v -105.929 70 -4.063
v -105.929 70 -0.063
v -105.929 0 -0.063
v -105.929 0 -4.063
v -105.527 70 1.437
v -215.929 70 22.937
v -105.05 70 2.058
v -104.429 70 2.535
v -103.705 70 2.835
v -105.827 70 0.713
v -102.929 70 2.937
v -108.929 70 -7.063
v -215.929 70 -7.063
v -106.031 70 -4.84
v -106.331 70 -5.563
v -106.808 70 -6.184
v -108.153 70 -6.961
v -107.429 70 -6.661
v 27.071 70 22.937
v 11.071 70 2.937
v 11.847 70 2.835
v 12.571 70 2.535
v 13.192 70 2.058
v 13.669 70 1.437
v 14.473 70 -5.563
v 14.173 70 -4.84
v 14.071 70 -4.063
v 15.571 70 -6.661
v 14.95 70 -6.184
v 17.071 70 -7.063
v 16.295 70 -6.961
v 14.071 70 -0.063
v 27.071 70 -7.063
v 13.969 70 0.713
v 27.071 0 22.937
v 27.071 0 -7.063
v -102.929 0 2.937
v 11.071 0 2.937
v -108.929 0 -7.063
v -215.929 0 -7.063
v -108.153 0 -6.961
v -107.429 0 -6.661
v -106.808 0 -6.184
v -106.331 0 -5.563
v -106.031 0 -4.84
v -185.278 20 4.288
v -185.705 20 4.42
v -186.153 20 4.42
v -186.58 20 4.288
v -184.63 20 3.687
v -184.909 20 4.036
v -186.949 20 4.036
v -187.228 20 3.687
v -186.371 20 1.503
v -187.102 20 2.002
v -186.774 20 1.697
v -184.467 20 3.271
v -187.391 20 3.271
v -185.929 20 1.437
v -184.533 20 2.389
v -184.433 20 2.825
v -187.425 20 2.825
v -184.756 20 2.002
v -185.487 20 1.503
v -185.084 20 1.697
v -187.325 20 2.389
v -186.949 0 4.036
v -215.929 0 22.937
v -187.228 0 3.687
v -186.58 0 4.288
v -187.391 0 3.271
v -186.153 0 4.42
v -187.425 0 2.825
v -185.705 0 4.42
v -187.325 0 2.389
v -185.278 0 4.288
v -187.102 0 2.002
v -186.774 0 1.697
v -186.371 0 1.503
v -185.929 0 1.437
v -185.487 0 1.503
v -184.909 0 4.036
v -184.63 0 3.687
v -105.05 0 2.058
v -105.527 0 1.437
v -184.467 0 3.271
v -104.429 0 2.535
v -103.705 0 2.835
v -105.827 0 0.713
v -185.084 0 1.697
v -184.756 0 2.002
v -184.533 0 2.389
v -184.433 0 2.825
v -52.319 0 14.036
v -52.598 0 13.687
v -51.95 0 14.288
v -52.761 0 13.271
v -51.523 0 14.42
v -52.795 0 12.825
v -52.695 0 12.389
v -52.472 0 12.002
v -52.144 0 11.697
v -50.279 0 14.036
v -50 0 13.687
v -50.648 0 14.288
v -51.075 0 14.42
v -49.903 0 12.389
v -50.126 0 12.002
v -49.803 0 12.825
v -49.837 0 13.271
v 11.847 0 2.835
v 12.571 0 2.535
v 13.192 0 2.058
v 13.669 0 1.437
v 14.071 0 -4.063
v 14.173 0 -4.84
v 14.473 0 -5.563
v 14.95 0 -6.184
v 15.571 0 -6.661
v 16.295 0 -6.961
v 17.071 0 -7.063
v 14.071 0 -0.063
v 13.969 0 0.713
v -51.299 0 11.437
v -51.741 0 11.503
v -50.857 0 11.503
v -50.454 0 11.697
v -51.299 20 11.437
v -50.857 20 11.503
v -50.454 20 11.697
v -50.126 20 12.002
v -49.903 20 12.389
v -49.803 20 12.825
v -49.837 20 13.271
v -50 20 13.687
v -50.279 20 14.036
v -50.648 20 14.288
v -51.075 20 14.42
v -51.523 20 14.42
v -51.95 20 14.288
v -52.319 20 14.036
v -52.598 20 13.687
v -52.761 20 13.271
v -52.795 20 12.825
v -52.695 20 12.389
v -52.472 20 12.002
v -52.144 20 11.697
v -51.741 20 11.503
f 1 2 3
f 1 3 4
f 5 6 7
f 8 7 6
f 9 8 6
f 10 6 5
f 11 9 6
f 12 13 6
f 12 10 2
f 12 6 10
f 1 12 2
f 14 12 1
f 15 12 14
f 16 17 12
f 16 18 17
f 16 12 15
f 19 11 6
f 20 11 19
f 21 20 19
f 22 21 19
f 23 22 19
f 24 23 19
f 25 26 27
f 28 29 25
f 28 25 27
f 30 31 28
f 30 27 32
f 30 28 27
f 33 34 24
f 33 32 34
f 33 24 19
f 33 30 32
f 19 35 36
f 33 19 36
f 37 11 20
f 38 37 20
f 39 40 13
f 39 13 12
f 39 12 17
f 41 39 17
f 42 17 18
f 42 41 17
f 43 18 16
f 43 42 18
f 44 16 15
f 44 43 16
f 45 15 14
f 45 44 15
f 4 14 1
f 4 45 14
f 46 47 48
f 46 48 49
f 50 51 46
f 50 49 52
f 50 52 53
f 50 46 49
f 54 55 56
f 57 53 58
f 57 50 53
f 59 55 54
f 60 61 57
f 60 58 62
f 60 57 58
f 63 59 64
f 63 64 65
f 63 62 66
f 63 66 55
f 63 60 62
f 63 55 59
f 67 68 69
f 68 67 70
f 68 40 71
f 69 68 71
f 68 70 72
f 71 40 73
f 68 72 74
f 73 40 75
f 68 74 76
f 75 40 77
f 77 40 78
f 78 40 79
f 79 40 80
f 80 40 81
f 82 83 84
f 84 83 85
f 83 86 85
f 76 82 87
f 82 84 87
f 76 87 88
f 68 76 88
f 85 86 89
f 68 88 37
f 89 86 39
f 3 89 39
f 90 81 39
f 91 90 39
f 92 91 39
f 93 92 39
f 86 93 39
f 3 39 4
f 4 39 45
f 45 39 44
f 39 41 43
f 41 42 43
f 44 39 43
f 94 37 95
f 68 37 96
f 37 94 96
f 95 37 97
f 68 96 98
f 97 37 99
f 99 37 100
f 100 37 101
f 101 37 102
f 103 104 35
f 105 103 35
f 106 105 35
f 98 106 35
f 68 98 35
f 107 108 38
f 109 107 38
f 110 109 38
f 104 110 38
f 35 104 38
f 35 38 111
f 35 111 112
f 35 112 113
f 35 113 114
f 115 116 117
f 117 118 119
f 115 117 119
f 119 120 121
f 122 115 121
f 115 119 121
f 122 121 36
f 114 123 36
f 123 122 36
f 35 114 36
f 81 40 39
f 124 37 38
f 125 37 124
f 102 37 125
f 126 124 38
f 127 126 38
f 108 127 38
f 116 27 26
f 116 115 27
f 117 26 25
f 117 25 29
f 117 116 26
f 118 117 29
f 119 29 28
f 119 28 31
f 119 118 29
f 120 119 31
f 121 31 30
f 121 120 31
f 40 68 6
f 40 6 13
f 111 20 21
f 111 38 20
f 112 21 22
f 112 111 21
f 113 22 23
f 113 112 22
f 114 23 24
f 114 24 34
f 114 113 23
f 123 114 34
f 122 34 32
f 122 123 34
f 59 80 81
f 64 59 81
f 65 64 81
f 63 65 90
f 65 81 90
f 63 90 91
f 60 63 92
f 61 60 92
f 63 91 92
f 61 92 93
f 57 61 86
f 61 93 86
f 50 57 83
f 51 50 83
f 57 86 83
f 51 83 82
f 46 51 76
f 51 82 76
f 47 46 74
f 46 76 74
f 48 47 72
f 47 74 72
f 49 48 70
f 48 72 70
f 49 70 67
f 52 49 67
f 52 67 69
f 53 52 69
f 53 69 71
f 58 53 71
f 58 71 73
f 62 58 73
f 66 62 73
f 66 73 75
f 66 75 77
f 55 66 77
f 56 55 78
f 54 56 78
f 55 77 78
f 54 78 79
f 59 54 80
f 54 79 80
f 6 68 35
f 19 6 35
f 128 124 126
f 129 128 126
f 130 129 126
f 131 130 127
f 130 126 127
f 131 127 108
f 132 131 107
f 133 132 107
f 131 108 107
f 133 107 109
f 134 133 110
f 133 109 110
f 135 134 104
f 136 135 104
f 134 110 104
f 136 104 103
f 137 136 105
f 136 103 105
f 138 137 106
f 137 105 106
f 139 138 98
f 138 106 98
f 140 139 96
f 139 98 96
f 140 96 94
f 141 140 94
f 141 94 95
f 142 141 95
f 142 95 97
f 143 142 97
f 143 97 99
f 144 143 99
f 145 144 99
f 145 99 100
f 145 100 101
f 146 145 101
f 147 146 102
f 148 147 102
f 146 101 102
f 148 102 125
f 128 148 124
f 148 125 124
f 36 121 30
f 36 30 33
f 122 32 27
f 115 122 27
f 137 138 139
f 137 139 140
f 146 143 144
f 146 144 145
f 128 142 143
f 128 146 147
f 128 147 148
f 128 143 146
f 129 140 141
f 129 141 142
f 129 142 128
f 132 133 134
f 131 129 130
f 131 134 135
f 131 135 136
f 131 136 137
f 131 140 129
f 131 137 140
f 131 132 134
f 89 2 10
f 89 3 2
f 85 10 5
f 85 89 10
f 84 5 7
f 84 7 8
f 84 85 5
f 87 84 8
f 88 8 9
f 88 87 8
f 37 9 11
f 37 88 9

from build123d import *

# Parameters (mm, degrees)
SKETCH1_W           = 243
SKETCH1_H           = 30
BOSS_EXTRUDE1_DEPTH = 70
SKETCH2_W           = 120
SKETCH2_H           = 10
CUT_EXTRUDE1_DEPTH  = 70
FILLET1_R           = 3
SKETCH3_R           = 3
CUT_EXTRUDE2_DEPTH  = 20
SKETCH4_R           = 11.000191916
SKETCH4_R_2         = 5.90738233
BOSS_EXTRUDE2_DEPTH = 39
SKETCH5_R           = 1.5
CUT_EXTRUDE3_DEPTH  = 20


with BuildPart() as part:
    # Sketch1 → Boss-Extrude1 (new body)
    with BuildSketch(Plane(origin=(0, 0, 0), x_dir=(1, 0, 0), z_dir=(0, 1, 0))):
        with Locations((-94.428984733, -7.936828819)):
            Rectangle(SKETCH1_W, SKETCH1_H)
    extrude(amount=BOSS_EXTRUDE1_DEPTH)

    # Sketch2 → Cut-Extrude1 (cut)
    with BuildSketch(Plane(origin=(0, 70, 0), x_dir=(1, 0, 0), z_dir=(0, 1, 0))):
        with Locations((-45.928984733, 2.063171181)):
            Rectangle(SKETCH2_W, SKETCH2_H)
    extrude(amount=-CUT_EXTRUDE1_DEPTH, mode=Mode.SUBTRACT)

    # Fillet1
    fillet1_edges = [part.edges().sort_by_distance(p)[0] for p in [
        (14.071015267, 35, -7.063171181),
        (14.071015267, 35, 2.936828819),
        (-105.928984733, 35, 2.936828819),
        (-105.928984733, 35, -7.063171181),
    ]]
    fillet(fillet1_edges, radius=FILLET1_R)

    # Sketch3 → Cut-Extrude2 (cut)
    with BuildSketch(Plane(origin=(0, 0, 0), x_dir=(-1, 0, 0), z_dir=(0, -1, 0))):
        with Locations(Location((51.298984733, -12.077870123, 0), (0, 0, 90))):
            Circle(SKETCH3_R)
        with Locations(Location((185.928984733, -2.936828819, 0), (0, 0, 90))):
            Circle(SKETCH3_R)
    extrude(amount=-CUT_EXTRUDE2_DEPTH, mode=Mode.SUBTRACT)

    # Sketch4 → Boss-Extrude2 (add)
    with BuildSketch(Plane(origin=(0, 0, 0), x_dir=(-1, 0, 0), z_dir=(0, -1, 0))):
        with Locations((188.57546064, -9.351449297)):
            Circle(SKETCH4_R)
        with Locations((51.298984733, -12.077870123)):
            Circle(SKETCH4_R_2)
    extrude(amount=-BOSS_EXTRUDE2_DEPTH)

    # Sketch5 → Cut-Extrude3 (cut)
    with BuildSketch(Plane(origin=(0, 0, 0), x_dir=(-1, 0, 0), z_dir=(0, -1, 0))):
        with Locations(Location((51.298984733, -12.936828819, 0), (0, 0, 90))):
            Circle(SKETCH5_R)
        with Locations(Location((185.928984733, -2.936828819, 0), (0, 0, 90))):
            Circle(SKETCH5_R)
    extrude(amount=-CUT_EXTRUDE3_DEPTH, mode=Mode.SUBTRACT)


solid = part.part
